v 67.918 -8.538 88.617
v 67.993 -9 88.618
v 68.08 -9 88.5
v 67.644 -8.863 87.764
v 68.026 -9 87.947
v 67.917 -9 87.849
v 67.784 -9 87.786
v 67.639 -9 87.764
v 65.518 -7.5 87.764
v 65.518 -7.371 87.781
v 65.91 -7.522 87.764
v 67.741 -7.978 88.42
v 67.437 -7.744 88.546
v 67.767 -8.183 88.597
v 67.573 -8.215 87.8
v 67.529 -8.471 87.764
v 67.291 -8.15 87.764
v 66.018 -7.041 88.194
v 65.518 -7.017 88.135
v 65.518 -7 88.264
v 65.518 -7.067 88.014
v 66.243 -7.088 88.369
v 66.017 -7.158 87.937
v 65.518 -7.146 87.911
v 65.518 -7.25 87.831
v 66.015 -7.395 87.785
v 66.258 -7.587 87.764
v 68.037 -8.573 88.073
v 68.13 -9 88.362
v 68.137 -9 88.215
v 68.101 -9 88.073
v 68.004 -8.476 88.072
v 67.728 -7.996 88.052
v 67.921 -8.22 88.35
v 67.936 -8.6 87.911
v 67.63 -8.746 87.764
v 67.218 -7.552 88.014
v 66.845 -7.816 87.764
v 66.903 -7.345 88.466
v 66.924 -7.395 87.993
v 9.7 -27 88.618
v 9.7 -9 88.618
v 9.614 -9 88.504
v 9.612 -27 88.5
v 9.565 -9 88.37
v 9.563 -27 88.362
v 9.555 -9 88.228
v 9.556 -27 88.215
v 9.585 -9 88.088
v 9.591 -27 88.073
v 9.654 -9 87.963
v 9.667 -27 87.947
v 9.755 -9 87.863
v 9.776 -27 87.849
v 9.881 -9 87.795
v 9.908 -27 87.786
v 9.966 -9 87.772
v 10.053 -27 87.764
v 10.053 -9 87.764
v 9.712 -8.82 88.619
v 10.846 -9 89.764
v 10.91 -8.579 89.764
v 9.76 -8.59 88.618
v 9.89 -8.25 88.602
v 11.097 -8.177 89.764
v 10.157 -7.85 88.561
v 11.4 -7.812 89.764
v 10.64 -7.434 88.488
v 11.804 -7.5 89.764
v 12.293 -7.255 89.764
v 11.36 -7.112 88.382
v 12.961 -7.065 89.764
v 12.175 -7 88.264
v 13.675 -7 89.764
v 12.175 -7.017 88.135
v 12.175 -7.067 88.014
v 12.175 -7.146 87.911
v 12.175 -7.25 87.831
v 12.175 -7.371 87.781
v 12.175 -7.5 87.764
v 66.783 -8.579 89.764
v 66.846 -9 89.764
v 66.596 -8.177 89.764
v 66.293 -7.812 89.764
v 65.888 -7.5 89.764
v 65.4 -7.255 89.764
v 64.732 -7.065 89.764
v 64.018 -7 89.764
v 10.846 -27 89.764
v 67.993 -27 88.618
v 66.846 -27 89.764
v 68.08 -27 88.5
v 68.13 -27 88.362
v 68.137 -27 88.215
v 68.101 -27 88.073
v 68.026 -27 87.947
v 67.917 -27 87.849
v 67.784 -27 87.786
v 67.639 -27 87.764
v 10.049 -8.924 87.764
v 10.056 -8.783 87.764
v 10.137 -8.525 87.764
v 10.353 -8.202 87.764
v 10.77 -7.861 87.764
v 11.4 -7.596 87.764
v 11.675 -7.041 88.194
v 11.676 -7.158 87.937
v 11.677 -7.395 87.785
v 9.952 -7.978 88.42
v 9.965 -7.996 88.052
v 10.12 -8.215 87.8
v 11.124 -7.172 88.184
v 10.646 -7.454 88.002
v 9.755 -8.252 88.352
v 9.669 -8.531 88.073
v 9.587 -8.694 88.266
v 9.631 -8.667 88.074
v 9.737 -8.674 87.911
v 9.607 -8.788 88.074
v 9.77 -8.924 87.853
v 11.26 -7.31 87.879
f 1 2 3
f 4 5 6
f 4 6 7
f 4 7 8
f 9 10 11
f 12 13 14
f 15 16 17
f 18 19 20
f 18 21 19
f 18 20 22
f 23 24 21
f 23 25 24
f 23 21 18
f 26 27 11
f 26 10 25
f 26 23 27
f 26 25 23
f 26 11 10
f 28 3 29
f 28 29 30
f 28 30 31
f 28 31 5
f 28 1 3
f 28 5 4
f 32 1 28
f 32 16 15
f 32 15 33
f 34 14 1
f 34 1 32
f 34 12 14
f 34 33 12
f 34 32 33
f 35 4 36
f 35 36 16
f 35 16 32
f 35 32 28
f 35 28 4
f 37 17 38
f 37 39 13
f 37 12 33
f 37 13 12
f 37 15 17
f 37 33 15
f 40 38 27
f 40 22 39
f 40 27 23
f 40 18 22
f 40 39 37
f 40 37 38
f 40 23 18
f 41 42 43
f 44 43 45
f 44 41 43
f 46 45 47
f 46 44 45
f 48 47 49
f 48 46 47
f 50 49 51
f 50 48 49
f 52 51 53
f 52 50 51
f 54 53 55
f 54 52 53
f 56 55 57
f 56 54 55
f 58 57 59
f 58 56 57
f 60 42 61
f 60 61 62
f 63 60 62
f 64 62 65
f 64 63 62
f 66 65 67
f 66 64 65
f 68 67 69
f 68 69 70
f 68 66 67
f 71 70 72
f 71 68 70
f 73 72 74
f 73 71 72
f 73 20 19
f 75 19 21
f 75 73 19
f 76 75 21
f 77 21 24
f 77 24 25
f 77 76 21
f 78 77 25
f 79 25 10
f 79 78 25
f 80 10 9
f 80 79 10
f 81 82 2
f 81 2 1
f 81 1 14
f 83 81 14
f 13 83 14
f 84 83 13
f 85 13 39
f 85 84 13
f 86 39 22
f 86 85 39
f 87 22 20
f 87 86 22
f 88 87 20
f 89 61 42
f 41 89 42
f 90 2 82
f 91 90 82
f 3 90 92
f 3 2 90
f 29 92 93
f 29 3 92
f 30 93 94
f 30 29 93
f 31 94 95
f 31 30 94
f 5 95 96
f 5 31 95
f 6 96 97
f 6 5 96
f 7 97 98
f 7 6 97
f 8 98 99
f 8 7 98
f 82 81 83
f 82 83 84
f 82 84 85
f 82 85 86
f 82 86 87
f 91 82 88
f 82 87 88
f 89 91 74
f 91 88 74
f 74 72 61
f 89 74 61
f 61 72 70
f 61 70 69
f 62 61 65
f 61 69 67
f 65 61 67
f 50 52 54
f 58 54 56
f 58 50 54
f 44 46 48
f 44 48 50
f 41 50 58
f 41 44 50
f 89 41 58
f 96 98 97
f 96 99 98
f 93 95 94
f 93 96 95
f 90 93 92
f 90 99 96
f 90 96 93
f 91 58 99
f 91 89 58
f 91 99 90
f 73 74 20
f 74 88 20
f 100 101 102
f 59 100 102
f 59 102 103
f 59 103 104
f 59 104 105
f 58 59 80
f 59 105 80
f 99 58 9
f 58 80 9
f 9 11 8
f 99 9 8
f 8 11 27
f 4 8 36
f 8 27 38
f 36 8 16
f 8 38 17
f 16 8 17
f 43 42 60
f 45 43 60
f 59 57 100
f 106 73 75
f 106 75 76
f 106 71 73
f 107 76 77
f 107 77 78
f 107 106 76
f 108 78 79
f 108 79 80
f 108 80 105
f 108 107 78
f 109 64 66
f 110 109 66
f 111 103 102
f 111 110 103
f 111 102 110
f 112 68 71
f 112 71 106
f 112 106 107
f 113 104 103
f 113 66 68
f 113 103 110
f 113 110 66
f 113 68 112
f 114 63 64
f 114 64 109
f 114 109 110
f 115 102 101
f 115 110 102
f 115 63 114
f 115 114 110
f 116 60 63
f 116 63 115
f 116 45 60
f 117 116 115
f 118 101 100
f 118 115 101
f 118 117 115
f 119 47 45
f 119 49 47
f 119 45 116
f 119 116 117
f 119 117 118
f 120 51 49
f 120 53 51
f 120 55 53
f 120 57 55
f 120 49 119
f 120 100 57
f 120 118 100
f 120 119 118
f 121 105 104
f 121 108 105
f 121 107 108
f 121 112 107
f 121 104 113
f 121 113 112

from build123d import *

# Parameters (mm, degrees)
EXTRUDE006_DEPTH = 20
FILLET025_R      = 2
FILLET026_R      = 0.5


with BuildPart() as part:
    # Sketch008 → Extrude006 (new body)
    with BuildSketch(Plane.XZ):
        Polygon((10.846248, 101.514289), (8.846248, 99.514289), (68.846248, 99.514289), (66.846248, 101.514289), align=None)
    extrude(amount=EXTRUDE006_DEPTH)


with BuildPart() as part_1:
    # Extrude006 placement: moved
    add(part.part.moved(Location((0.5, -6.5, -11.5))))

    # Fillet025
    fillet025_edges = [part_1.edges().sort_by_distance(p)[0] for p in [
        (10.346248, -6.5, 89.014289),
        (68.346248, -6.5, 89.014289),
    ]]
    fillet(fillet025_edges, radius=FILLET025_R)

    # Fillet026
    fillet026_edges = [part_1.edges().sort_by_distance(p)[0] for p in [
        (9.346248, -17.5, 88.014289),
        (69.346248, -17.5, 88.014289),
    ]]
    fillet(fillet026_edges, radius=FILLET026_R)


with BuildPart() as part_2:
    # Fillet026 placement: moved
    add(part_1.part.moved(Location((-0.5, -0.5, -0.25))))


solid = part_2.part
